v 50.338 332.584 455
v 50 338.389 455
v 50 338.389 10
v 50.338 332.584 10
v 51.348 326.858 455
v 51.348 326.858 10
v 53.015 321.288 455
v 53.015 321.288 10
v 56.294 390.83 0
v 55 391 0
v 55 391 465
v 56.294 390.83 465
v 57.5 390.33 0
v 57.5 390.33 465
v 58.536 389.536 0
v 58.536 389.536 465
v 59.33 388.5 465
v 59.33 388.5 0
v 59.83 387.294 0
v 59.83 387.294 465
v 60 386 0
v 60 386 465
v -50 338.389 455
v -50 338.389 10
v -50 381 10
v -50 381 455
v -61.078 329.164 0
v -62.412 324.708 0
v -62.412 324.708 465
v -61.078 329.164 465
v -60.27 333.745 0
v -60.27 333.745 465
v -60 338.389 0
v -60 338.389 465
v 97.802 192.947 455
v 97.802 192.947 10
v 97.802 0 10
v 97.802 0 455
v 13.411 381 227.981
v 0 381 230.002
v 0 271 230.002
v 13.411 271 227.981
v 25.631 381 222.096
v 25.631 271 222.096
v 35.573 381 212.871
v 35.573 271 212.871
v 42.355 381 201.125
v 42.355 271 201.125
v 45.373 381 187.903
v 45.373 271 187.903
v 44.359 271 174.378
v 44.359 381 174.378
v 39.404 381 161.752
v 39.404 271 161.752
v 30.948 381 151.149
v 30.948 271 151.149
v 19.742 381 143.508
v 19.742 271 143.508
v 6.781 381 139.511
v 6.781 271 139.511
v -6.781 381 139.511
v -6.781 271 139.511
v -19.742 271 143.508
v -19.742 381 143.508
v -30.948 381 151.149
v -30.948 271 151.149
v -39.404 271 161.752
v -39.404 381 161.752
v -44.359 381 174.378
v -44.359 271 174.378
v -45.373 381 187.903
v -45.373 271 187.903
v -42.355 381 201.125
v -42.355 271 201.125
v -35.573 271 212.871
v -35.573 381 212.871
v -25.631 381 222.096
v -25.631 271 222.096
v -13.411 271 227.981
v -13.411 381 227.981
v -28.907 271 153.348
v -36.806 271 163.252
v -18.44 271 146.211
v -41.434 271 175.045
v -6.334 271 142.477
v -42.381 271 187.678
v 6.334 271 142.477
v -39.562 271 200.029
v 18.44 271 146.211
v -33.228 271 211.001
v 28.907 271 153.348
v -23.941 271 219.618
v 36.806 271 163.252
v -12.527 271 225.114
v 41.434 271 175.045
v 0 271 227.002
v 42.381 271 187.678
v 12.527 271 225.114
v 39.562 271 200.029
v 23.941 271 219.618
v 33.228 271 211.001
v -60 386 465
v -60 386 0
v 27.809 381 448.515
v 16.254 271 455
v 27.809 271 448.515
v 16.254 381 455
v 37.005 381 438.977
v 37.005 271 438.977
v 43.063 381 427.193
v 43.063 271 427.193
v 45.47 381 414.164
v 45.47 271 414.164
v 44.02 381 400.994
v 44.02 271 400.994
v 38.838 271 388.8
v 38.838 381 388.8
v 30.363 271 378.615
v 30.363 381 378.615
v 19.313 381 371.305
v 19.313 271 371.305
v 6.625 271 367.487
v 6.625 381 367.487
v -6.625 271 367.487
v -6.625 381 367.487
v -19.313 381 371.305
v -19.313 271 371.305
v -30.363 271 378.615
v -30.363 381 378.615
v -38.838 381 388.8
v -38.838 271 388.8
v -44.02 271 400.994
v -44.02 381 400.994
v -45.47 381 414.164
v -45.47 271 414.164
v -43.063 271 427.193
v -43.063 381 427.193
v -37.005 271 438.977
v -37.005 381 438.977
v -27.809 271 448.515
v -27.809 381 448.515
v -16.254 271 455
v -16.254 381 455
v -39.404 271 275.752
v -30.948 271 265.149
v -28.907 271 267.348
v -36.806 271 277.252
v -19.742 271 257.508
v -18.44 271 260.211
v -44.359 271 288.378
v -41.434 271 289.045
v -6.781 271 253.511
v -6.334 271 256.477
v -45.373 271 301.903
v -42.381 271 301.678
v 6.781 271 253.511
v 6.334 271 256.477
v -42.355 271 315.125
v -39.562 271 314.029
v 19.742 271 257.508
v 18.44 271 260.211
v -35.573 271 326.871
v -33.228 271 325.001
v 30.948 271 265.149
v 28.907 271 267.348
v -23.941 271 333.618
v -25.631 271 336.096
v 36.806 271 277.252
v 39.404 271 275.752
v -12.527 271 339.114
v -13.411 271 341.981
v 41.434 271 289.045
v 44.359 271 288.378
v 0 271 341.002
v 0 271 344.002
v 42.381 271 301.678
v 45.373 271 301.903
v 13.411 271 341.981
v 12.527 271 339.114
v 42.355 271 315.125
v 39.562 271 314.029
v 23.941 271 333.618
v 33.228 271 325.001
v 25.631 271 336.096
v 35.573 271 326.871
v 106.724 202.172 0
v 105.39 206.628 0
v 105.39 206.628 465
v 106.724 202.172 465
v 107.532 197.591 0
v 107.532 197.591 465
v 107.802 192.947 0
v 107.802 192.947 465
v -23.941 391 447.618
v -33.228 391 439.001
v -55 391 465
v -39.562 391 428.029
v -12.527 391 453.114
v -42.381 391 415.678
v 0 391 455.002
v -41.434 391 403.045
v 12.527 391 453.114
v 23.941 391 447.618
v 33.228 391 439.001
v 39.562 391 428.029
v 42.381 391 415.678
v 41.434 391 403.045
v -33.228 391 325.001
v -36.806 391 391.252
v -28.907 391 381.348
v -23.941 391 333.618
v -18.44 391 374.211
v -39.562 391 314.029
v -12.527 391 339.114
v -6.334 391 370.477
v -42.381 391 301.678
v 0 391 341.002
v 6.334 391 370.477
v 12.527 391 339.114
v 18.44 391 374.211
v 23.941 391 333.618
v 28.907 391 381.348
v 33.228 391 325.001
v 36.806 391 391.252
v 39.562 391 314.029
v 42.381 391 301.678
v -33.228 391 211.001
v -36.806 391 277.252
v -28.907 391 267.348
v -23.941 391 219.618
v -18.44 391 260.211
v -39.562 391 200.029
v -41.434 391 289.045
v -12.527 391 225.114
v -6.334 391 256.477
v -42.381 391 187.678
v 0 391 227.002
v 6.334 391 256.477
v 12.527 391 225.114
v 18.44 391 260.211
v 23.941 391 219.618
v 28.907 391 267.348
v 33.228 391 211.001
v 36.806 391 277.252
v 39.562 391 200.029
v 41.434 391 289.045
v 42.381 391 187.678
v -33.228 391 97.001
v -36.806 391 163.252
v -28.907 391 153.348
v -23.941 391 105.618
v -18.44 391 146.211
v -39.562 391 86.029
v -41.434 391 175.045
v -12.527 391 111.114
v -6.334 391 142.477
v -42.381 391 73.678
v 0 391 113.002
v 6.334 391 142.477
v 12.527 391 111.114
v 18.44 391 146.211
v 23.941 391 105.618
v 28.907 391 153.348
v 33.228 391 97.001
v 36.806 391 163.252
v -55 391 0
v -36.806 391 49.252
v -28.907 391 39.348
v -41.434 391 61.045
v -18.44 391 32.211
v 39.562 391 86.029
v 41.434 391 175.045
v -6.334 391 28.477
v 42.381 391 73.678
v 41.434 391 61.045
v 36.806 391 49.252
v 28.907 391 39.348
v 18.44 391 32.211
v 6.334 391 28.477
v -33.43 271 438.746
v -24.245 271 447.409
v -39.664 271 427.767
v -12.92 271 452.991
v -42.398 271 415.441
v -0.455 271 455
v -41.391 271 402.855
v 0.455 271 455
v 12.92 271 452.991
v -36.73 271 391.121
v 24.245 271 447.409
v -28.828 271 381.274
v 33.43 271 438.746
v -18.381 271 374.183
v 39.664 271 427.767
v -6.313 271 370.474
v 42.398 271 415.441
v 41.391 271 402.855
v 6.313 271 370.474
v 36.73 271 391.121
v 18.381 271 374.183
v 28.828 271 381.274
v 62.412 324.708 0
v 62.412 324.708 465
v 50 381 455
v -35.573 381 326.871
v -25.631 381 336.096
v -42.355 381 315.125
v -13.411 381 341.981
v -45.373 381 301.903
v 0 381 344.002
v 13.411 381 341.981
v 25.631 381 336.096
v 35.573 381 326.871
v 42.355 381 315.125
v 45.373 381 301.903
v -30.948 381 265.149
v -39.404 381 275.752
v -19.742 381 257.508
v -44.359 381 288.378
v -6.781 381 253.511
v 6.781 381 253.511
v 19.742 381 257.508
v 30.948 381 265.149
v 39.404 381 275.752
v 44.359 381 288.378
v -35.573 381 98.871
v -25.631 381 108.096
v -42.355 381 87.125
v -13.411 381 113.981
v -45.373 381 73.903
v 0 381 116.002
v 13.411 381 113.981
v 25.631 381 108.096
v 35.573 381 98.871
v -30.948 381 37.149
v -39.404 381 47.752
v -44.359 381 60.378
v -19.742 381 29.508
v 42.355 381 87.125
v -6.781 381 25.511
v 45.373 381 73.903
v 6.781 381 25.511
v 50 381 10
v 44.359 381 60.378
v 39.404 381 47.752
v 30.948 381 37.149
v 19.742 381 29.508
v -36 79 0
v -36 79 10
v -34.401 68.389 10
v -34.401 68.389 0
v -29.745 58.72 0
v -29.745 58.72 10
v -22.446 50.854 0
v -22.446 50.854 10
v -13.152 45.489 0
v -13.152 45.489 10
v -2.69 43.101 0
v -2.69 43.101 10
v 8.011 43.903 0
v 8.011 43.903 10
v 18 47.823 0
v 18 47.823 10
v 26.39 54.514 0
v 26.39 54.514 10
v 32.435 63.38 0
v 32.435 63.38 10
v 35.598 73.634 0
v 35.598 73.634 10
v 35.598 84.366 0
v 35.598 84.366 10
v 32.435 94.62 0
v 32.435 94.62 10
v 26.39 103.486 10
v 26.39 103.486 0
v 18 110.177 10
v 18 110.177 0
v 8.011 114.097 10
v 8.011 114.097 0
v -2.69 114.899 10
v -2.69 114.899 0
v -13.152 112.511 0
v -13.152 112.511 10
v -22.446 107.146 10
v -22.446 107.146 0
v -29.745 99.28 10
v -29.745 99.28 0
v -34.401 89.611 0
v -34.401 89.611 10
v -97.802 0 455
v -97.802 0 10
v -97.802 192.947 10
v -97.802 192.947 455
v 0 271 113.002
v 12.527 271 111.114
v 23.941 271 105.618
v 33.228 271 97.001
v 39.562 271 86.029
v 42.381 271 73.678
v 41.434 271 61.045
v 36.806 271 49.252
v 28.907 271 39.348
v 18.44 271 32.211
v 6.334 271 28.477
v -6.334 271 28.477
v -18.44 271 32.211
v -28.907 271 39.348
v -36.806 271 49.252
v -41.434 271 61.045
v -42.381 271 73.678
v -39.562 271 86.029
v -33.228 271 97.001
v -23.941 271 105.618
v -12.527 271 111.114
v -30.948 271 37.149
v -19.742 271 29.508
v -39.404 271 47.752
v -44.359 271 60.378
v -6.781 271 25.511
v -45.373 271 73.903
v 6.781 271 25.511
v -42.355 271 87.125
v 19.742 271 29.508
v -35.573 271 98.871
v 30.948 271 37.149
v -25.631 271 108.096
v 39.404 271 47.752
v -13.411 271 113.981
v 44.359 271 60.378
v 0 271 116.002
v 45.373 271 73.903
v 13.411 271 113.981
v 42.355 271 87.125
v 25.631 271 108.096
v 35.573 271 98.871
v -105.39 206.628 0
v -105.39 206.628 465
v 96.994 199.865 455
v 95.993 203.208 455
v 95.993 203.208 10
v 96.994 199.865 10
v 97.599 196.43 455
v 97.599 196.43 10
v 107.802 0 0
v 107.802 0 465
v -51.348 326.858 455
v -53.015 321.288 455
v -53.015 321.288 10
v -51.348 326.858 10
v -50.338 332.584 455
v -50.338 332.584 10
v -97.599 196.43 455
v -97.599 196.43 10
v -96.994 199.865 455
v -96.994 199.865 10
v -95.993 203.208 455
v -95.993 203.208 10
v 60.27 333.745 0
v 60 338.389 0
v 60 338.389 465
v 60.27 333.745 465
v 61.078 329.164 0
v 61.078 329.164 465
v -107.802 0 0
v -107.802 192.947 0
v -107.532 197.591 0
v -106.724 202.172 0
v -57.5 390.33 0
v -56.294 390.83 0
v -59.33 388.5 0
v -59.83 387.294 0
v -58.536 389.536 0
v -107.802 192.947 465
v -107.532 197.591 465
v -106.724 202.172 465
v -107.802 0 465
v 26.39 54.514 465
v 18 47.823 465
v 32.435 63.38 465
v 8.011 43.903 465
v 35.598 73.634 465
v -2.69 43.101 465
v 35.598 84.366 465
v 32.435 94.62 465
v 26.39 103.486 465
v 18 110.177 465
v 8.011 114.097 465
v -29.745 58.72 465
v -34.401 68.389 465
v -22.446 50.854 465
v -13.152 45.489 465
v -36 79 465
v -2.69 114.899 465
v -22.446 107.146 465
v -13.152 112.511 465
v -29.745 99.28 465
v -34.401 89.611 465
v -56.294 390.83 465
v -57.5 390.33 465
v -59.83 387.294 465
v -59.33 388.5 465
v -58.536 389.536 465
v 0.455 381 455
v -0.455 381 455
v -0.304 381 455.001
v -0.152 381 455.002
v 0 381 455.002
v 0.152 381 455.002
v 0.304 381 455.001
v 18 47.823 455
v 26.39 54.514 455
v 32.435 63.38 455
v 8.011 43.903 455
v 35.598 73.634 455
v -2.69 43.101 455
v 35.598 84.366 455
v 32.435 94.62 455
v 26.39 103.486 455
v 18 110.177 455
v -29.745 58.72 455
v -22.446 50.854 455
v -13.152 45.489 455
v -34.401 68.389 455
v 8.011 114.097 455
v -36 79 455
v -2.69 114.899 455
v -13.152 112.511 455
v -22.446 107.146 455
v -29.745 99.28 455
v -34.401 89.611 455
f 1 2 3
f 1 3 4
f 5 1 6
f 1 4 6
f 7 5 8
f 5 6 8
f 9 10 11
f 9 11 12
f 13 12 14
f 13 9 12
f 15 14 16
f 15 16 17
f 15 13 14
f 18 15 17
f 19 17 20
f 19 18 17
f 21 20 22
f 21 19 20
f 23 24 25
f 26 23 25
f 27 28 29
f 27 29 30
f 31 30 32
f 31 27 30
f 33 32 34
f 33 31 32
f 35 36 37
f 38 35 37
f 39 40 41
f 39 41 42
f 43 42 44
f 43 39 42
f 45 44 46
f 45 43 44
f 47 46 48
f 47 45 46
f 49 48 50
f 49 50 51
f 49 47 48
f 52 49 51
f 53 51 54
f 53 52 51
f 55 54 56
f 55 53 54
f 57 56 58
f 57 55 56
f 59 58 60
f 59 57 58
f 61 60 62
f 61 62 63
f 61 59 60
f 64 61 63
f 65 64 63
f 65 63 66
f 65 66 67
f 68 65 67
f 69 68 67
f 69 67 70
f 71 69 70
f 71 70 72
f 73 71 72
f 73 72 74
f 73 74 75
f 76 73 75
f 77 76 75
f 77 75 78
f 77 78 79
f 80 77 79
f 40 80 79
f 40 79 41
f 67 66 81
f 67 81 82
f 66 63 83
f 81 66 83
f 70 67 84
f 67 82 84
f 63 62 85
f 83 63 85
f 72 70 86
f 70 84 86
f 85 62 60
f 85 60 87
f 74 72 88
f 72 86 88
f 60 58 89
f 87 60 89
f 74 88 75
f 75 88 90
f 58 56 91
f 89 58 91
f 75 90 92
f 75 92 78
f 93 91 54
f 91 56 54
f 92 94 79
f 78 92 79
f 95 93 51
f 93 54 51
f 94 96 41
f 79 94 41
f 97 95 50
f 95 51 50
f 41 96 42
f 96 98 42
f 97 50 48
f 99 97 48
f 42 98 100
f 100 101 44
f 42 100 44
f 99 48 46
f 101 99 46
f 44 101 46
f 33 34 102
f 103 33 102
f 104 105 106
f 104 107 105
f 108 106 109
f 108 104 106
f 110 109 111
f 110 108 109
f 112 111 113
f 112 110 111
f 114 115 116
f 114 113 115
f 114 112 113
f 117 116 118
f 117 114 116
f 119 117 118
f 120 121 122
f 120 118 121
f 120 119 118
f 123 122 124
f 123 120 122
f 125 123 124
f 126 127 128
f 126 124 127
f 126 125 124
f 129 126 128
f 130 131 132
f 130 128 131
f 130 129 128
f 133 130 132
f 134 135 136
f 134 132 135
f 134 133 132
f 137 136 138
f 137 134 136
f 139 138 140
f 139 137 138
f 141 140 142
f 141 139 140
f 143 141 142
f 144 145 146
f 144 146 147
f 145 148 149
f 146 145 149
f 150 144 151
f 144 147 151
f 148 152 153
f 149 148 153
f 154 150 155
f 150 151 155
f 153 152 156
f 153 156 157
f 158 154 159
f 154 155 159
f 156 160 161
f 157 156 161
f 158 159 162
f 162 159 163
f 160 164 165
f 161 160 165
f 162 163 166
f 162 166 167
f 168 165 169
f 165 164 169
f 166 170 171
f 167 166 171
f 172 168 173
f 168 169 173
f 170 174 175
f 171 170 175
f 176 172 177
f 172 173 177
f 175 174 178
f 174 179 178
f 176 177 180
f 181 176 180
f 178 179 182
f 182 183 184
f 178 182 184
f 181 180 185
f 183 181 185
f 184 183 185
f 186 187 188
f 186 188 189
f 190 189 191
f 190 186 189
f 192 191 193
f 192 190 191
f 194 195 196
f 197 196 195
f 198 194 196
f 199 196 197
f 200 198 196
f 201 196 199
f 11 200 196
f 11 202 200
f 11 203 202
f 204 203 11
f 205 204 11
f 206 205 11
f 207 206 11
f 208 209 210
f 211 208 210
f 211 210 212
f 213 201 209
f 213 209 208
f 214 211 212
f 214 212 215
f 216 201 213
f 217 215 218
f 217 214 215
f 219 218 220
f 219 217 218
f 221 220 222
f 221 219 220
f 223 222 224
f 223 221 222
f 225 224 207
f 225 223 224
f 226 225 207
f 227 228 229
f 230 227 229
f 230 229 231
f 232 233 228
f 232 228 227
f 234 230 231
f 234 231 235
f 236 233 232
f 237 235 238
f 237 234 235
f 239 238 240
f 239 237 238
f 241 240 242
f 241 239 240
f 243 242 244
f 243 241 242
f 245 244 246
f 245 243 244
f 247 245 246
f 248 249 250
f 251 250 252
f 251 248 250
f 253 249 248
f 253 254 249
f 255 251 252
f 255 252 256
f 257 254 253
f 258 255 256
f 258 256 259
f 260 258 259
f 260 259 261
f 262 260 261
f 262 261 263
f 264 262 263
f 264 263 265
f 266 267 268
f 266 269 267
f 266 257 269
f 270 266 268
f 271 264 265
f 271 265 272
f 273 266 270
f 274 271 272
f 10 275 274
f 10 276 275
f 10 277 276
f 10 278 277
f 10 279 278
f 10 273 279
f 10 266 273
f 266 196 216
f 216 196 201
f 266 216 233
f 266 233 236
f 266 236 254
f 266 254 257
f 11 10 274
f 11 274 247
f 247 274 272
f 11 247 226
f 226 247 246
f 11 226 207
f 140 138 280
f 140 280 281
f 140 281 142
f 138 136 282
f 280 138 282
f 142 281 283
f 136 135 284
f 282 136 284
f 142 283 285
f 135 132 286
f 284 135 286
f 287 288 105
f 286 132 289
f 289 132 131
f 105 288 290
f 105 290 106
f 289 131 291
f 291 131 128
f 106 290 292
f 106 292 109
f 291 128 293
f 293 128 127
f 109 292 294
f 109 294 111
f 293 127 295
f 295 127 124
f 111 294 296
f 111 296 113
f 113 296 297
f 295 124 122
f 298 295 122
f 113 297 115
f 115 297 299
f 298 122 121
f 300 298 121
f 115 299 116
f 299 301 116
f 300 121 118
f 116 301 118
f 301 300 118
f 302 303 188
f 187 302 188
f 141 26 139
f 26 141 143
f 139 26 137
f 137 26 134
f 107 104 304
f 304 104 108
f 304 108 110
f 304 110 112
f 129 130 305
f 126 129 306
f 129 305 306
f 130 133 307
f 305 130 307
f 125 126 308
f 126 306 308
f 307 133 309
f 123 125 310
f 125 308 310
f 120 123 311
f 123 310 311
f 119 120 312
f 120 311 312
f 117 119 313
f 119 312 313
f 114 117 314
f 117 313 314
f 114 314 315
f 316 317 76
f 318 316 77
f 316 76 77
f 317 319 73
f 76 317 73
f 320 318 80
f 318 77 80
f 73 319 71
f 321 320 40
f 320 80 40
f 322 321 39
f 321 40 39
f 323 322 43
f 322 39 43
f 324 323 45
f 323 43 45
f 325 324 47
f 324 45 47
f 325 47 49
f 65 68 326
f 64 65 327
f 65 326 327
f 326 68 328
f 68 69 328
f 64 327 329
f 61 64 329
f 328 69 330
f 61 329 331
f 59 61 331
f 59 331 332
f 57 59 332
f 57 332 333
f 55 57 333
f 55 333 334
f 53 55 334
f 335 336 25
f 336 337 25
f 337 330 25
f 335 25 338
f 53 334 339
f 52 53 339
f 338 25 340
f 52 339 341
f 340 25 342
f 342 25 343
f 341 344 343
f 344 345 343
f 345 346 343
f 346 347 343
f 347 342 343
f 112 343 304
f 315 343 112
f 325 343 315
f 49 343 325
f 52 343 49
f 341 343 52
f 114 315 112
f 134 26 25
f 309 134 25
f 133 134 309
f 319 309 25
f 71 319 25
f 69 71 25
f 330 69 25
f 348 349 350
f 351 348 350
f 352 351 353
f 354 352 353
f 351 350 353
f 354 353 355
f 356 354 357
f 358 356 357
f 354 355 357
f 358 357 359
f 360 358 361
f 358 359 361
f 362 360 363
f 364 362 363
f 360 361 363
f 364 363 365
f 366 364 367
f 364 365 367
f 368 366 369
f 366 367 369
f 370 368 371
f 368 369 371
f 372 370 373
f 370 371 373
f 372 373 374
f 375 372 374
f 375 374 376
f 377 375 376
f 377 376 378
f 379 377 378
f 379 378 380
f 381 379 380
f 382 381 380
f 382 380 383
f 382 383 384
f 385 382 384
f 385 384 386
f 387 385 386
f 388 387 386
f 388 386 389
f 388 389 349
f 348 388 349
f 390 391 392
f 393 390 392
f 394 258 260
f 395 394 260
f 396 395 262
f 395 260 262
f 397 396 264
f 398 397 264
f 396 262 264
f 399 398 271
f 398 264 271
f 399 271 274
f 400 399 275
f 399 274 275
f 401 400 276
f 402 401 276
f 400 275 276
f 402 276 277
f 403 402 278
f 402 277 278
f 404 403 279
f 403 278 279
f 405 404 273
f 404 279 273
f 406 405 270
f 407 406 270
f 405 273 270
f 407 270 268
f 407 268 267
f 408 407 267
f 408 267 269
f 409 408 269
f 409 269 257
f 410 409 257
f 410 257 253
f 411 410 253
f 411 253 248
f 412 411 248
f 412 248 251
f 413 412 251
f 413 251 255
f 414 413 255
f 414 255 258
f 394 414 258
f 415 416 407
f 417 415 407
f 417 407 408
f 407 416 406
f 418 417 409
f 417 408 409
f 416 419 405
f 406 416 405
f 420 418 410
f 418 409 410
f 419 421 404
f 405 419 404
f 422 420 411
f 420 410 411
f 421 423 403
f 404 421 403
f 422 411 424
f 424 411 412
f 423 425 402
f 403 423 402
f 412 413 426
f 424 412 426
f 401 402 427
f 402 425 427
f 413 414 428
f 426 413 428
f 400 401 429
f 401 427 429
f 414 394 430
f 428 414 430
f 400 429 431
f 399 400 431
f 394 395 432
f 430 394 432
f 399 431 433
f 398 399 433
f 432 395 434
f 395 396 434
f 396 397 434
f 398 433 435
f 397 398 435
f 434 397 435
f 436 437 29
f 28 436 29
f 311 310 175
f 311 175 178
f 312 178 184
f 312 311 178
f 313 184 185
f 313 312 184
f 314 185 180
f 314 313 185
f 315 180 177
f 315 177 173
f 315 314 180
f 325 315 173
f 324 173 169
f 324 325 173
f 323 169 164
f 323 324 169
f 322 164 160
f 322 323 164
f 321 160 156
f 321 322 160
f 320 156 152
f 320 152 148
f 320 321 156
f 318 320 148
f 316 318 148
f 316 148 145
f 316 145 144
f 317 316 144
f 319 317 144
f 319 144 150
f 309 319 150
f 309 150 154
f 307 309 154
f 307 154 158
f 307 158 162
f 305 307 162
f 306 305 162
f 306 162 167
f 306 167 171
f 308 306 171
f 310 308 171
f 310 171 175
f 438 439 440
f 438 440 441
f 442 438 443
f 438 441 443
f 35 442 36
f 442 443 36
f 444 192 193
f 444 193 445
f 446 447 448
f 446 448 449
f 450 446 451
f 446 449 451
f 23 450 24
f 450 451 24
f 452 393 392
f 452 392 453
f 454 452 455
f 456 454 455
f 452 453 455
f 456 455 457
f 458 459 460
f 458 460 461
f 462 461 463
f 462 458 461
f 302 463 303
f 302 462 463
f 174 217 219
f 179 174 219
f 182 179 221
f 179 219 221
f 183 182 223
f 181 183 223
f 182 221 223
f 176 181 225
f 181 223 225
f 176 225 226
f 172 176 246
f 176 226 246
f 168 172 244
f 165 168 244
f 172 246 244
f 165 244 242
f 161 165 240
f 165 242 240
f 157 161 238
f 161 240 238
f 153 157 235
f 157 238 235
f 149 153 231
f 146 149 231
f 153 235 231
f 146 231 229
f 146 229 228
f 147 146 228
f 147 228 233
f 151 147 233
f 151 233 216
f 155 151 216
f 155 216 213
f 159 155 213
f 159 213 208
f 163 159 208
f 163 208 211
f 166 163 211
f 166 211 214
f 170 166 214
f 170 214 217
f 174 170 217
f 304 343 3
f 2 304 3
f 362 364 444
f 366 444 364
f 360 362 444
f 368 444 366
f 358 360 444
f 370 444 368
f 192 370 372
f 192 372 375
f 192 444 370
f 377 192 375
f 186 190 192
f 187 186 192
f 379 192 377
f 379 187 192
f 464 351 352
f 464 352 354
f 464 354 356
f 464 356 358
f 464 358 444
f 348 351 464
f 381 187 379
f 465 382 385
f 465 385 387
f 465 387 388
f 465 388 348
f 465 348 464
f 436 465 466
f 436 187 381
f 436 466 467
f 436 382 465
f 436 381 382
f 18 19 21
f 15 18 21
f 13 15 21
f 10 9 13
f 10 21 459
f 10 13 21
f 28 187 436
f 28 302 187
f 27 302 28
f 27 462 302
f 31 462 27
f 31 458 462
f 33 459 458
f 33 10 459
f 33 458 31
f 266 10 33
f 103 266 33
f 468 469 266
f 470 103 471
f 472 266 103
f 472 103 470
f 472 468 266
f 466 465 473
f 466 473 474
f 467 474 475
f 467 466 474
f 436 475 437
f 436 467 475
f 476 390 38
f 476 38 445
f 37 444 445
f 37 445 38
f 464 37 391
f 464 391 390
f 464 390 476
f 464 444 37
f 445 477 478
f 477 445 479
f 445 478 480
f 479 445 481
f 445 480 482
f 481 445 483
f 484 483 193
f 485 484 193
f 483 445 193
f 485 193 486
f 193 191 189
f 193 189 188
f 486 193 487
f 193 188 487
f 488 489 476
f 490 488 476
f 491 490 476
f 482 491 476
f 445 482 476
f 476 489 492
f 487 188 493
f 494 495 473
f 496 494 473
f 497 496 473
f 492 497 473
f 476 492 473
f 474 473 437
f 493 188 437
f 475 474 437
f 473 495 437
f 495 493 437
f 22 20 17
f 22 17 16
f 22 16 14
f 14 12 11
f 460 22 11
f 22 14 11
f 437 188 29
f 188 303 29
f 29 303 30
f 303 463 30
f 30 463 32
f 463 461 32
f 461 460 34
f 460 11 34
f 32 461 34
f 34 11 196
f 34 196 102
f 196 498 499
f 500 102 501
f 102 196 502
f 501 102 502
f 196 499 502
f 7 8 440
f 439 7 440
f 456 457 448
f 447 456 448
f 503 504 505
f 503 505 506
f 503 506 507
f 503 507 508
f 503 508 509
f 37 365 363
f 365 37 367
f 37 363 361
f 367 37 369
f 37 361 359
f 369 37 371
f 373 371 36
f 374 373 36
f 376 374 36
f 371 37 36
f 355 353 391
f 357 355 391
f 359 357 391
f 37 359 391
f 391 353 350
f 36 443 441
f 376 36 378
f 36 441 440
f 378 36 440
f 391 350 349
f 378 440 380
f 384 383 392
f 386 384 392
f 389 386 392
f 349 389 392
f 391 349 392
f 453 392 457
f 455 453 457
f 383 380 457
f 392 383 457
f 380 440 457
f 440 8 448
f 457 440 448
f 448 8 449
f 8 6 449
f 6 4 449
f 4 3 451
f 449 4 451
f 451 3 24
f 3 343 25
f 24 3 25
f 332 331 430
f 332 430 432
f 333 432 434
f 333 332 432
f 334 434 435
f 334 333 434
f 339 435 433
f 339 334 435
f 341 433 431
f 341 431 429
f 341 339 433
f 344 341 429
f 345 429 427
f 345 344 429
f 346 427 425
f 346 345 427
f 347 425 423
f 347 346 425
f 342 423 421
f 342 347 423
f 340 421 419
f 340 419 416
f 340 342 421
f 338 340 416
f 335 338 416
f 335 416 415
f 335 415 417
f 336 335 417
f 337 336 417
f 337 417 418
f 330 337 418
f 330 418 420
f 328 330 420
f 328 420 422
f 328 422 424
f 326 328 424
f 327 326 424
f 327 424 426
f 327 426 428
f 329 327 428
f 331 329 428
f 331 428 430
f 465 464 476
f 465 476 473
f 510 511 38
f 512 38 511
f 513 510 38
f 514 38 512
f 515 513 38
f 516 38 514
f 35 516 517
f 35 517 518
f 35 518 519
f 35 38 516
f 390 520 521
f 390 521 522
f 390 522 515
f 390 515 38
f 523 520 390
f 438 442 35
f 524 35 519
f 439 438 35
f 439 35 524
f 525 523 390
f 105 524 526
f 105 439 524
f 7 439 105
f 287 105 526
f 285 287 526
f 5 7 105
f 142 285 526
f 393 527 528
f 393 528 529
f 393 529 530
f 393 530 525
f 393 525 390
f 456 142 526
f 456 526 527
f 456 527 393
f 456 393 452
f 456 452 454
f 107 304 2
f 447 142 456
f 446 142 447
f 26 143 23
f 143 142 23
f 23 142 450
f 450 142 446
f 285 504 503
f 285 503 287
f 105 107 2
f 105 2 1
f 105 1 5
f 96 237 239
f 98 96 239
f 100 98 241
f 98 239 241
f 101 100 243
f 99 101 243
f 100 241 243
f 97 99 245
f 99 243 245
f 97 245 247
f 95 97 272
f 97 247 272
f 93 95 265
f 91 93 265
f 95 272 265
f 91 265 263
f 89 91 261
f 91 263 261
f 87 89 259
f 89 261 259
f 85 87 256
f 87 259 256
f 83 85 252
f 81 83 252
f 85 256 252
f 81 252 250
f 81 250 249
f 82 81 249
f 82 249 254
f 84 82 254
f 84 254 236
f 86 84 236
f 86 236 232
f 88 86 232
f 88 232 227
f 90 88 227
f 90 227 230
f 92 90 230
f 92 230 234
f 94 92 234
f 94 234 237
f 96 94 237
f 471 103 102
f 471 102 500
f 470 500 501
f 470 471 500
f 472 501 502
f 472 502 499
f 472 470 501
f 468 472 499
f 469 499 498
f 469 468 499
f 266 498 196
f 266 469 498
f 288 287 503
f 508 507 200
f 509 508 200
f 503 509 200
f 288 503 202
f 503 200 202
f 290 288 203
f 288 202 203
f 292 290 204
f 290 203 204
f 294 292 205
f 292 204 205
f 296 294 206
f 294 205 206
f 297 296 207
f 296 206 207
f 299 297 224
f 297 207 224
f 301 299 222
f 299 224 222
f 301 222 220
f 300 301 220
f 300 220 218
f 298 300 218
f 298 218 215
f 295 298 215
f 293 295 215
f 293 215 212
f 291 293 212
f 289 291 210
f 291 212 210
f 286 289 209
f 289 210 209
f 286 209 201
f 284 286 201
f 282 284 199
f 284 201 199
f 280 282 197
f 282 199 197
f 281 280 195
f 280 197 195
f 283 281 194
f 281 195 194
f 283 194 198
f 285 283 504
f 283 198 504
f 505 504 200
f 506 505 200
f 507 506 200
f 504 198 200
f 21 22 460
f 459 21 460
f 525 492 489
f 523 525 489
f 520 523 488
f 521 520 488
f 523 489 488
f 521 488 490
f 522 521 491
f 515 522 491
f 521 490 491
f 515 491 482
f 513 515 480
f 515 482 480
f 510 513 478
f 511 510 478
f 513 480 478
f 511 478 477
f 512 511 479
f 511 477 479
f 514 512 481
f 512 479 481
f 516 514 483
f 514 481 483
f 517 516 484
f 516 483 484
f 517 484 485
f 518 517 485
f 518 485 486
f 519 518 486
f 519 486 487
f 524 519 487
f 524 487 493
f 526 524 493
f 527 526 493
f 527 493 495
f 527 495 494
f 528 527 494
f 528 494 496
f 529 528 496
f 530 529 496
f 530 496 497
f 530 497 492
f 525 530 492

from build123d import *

# Parameters (mm, degrees)
BOSS_EXTRUDE1_DEPTH  = 465
SHELL1_T             = -10
SKETCH3_R            = 36
CUT_EXTRUDE2_DEPTH   = 570
SKETCH2_R            = 42.5
CUT_EXTRUDE3_DEPTH   = 10
SKETCH6_R            = 45.5
SKETCH6_R_2          = 42.5
BOSS_EXTRUDE14_DEPTH = 120


with BuildPart() as part:
    # Sketch1 → Boss-Extrude1 (new body)
    with BuildSketch(Plane.XY):
        with BuildLine():
            Line((107.802304208, 0), (-107.802304208, 0))
            Line((-107.802304208, 0), (-107.802304208, 192.946920772))
            ThreePointArc((-107.802304208, 192.946920772), (-107.194614328, 199.892847878), (-105.390009039, 206.627726505))
            Line((-105.390009039, 206.627726505), (-62.412295169, 324.708024904))
            ThreePointArc((-62.412295169, 324.708024904), (-60.60768988, 331.442903531), (-60, 338.388830637))
            Line((-60, 338.388830637), (-60, 386))
            ThreePointArc((-60, 386), (-58.535533906, 389.535533906), (-55, 391))
            Line((-55, 391), (55, 391))
            ThreePointArc((55, 391), (58.535533906, 389.535533906), (60, 386))
            Line((60, 386), (60, 338.388830637))
            ThreePointArc((60, 338.388830637), (60.60768988, 331.442903531), (62.412295169, 324.708024904))
            Line((62.412295169, 324.708024904), (105.390009039, 206.627726505))
            ThreePointArc((105.390009039, 206.627726505), (107.194614328, 199.892847878), (107.802304208, 192.946920772))
            Line((107.802304208, 192.946920772), (107.802304208, 0))
        make_face()
    extrude(amount=BOSS_EXTRUDE1_DEPTH)

    # Shell1
    shell1_openings = [part.faces().sort_by_distance(p)[0] for p in [
        (0, 0, 232.5),
    ]]
    offset(amount=SHELL1_T, openings=shell1_openings, kind=Kind.INTERSECTION)

    # Sketch3 → Cut-Extrude2 (cut)
    with BuildSketch(Plane.XY.offset(465)):
        with Locations(Location((0, 79, 0), (0, 0, 180))):
            Circle(SKETCH3_R)
    extrude(amount=-CUT_EXTRUDE2_DEPTH, mode=Mode.SUBTRACT)

    # Sketch2 → Cut-Extrude3 (cut)
    with BuildSketch(Plane(origin=(0, 391, 0), x_dir=(1, 0, 0), z_dir=(0, 1, 0))):
        with Locations(Location((0, -70.502440314, 0), (0, 0, 270))):
            Circle(SKETCH2_R)
        with Locations(Location((0, -184.502440314, 0), (0, 0, 270))):
            Circle(SKETCH2_R)
        with Locations(Location((0, -298.502440314, 0), (0, 0, 270))):
            Circle(SKETCH2_R)
        with Locations(Location((0, -412.502440314, 0), (0, 0, 270))):
            Circle(SKETCH2_R)
    extrude(amount=-CUT_EXTRUDE3_DEPTH, mode=Mode.SUBTRACT)

    # Sketch6 → Boss-Extrude14 (add)
    # profile 1 of 4: a face of its own
    with BuildSketch(Plane(origin=(0, 391, 0), x_dir=(1, 0, 0), z_dir=(0, 1, 0))):
        with Locations((0, -412.502440314)):
            Circle(SKETCH6_R)
        with Locations(Location((0, -412.502440314, 0), (0, 0, 270))):
            Circle(SKETCH6_R_2, mode=Mode.SUBTRACT)
    # profile 2 of 4: a face of its own
    with BuildSketch(Plane(origin=(0, 391, 0), x_dir=(1, 0, 0), z_dir=(0, 1, 0))):
        with Locations(Location((0, -298.502440314, 0), (0, 0, 270))):
            Circle(SKETCH6_R)
        with Locations(Location((0, -298.502440314, 0), (0, 0, 270))):
            Circle(SKETCH6_R_2, mode=Mode.SUBTRACT)
    # profile 3 of 4: a face of its own
    with BuildSketch(Plane(origin=(0, 391, 0), x_dir=(1, 0, 0), z_dir=(0, 1, 0))):
        with Locations(Location((0, -184.502440314, 0), (0, 0, 270))):
            Circle(SKETCH6_R)
        with Locations(Location((0, -184.502440314, 0), (0, 0, 270))):
            Circle(SKETCH6_R_2, mode=Mode.SUBTRACT)
    # profile 4 of 4: a face of its own
    with BuildSketch(Plane(origin=(0, 391, 0), x_dir=(1, 0, 0), z_dir=(0, 1, 0))):
        with Locations(Location((0, -70.502440314, 0), (0, 0, 270))):
            Circle(SKETCH6_R)
        with Locations(Location((0, -70.502440314, 0), (0, 0, 270))):
            Circle(SKETCH6_R_2, mode=Mode.SUBTRACT)
    extrude(amount=-BOSS_EXTRUDE14_DEPTH)


solid = part.part
